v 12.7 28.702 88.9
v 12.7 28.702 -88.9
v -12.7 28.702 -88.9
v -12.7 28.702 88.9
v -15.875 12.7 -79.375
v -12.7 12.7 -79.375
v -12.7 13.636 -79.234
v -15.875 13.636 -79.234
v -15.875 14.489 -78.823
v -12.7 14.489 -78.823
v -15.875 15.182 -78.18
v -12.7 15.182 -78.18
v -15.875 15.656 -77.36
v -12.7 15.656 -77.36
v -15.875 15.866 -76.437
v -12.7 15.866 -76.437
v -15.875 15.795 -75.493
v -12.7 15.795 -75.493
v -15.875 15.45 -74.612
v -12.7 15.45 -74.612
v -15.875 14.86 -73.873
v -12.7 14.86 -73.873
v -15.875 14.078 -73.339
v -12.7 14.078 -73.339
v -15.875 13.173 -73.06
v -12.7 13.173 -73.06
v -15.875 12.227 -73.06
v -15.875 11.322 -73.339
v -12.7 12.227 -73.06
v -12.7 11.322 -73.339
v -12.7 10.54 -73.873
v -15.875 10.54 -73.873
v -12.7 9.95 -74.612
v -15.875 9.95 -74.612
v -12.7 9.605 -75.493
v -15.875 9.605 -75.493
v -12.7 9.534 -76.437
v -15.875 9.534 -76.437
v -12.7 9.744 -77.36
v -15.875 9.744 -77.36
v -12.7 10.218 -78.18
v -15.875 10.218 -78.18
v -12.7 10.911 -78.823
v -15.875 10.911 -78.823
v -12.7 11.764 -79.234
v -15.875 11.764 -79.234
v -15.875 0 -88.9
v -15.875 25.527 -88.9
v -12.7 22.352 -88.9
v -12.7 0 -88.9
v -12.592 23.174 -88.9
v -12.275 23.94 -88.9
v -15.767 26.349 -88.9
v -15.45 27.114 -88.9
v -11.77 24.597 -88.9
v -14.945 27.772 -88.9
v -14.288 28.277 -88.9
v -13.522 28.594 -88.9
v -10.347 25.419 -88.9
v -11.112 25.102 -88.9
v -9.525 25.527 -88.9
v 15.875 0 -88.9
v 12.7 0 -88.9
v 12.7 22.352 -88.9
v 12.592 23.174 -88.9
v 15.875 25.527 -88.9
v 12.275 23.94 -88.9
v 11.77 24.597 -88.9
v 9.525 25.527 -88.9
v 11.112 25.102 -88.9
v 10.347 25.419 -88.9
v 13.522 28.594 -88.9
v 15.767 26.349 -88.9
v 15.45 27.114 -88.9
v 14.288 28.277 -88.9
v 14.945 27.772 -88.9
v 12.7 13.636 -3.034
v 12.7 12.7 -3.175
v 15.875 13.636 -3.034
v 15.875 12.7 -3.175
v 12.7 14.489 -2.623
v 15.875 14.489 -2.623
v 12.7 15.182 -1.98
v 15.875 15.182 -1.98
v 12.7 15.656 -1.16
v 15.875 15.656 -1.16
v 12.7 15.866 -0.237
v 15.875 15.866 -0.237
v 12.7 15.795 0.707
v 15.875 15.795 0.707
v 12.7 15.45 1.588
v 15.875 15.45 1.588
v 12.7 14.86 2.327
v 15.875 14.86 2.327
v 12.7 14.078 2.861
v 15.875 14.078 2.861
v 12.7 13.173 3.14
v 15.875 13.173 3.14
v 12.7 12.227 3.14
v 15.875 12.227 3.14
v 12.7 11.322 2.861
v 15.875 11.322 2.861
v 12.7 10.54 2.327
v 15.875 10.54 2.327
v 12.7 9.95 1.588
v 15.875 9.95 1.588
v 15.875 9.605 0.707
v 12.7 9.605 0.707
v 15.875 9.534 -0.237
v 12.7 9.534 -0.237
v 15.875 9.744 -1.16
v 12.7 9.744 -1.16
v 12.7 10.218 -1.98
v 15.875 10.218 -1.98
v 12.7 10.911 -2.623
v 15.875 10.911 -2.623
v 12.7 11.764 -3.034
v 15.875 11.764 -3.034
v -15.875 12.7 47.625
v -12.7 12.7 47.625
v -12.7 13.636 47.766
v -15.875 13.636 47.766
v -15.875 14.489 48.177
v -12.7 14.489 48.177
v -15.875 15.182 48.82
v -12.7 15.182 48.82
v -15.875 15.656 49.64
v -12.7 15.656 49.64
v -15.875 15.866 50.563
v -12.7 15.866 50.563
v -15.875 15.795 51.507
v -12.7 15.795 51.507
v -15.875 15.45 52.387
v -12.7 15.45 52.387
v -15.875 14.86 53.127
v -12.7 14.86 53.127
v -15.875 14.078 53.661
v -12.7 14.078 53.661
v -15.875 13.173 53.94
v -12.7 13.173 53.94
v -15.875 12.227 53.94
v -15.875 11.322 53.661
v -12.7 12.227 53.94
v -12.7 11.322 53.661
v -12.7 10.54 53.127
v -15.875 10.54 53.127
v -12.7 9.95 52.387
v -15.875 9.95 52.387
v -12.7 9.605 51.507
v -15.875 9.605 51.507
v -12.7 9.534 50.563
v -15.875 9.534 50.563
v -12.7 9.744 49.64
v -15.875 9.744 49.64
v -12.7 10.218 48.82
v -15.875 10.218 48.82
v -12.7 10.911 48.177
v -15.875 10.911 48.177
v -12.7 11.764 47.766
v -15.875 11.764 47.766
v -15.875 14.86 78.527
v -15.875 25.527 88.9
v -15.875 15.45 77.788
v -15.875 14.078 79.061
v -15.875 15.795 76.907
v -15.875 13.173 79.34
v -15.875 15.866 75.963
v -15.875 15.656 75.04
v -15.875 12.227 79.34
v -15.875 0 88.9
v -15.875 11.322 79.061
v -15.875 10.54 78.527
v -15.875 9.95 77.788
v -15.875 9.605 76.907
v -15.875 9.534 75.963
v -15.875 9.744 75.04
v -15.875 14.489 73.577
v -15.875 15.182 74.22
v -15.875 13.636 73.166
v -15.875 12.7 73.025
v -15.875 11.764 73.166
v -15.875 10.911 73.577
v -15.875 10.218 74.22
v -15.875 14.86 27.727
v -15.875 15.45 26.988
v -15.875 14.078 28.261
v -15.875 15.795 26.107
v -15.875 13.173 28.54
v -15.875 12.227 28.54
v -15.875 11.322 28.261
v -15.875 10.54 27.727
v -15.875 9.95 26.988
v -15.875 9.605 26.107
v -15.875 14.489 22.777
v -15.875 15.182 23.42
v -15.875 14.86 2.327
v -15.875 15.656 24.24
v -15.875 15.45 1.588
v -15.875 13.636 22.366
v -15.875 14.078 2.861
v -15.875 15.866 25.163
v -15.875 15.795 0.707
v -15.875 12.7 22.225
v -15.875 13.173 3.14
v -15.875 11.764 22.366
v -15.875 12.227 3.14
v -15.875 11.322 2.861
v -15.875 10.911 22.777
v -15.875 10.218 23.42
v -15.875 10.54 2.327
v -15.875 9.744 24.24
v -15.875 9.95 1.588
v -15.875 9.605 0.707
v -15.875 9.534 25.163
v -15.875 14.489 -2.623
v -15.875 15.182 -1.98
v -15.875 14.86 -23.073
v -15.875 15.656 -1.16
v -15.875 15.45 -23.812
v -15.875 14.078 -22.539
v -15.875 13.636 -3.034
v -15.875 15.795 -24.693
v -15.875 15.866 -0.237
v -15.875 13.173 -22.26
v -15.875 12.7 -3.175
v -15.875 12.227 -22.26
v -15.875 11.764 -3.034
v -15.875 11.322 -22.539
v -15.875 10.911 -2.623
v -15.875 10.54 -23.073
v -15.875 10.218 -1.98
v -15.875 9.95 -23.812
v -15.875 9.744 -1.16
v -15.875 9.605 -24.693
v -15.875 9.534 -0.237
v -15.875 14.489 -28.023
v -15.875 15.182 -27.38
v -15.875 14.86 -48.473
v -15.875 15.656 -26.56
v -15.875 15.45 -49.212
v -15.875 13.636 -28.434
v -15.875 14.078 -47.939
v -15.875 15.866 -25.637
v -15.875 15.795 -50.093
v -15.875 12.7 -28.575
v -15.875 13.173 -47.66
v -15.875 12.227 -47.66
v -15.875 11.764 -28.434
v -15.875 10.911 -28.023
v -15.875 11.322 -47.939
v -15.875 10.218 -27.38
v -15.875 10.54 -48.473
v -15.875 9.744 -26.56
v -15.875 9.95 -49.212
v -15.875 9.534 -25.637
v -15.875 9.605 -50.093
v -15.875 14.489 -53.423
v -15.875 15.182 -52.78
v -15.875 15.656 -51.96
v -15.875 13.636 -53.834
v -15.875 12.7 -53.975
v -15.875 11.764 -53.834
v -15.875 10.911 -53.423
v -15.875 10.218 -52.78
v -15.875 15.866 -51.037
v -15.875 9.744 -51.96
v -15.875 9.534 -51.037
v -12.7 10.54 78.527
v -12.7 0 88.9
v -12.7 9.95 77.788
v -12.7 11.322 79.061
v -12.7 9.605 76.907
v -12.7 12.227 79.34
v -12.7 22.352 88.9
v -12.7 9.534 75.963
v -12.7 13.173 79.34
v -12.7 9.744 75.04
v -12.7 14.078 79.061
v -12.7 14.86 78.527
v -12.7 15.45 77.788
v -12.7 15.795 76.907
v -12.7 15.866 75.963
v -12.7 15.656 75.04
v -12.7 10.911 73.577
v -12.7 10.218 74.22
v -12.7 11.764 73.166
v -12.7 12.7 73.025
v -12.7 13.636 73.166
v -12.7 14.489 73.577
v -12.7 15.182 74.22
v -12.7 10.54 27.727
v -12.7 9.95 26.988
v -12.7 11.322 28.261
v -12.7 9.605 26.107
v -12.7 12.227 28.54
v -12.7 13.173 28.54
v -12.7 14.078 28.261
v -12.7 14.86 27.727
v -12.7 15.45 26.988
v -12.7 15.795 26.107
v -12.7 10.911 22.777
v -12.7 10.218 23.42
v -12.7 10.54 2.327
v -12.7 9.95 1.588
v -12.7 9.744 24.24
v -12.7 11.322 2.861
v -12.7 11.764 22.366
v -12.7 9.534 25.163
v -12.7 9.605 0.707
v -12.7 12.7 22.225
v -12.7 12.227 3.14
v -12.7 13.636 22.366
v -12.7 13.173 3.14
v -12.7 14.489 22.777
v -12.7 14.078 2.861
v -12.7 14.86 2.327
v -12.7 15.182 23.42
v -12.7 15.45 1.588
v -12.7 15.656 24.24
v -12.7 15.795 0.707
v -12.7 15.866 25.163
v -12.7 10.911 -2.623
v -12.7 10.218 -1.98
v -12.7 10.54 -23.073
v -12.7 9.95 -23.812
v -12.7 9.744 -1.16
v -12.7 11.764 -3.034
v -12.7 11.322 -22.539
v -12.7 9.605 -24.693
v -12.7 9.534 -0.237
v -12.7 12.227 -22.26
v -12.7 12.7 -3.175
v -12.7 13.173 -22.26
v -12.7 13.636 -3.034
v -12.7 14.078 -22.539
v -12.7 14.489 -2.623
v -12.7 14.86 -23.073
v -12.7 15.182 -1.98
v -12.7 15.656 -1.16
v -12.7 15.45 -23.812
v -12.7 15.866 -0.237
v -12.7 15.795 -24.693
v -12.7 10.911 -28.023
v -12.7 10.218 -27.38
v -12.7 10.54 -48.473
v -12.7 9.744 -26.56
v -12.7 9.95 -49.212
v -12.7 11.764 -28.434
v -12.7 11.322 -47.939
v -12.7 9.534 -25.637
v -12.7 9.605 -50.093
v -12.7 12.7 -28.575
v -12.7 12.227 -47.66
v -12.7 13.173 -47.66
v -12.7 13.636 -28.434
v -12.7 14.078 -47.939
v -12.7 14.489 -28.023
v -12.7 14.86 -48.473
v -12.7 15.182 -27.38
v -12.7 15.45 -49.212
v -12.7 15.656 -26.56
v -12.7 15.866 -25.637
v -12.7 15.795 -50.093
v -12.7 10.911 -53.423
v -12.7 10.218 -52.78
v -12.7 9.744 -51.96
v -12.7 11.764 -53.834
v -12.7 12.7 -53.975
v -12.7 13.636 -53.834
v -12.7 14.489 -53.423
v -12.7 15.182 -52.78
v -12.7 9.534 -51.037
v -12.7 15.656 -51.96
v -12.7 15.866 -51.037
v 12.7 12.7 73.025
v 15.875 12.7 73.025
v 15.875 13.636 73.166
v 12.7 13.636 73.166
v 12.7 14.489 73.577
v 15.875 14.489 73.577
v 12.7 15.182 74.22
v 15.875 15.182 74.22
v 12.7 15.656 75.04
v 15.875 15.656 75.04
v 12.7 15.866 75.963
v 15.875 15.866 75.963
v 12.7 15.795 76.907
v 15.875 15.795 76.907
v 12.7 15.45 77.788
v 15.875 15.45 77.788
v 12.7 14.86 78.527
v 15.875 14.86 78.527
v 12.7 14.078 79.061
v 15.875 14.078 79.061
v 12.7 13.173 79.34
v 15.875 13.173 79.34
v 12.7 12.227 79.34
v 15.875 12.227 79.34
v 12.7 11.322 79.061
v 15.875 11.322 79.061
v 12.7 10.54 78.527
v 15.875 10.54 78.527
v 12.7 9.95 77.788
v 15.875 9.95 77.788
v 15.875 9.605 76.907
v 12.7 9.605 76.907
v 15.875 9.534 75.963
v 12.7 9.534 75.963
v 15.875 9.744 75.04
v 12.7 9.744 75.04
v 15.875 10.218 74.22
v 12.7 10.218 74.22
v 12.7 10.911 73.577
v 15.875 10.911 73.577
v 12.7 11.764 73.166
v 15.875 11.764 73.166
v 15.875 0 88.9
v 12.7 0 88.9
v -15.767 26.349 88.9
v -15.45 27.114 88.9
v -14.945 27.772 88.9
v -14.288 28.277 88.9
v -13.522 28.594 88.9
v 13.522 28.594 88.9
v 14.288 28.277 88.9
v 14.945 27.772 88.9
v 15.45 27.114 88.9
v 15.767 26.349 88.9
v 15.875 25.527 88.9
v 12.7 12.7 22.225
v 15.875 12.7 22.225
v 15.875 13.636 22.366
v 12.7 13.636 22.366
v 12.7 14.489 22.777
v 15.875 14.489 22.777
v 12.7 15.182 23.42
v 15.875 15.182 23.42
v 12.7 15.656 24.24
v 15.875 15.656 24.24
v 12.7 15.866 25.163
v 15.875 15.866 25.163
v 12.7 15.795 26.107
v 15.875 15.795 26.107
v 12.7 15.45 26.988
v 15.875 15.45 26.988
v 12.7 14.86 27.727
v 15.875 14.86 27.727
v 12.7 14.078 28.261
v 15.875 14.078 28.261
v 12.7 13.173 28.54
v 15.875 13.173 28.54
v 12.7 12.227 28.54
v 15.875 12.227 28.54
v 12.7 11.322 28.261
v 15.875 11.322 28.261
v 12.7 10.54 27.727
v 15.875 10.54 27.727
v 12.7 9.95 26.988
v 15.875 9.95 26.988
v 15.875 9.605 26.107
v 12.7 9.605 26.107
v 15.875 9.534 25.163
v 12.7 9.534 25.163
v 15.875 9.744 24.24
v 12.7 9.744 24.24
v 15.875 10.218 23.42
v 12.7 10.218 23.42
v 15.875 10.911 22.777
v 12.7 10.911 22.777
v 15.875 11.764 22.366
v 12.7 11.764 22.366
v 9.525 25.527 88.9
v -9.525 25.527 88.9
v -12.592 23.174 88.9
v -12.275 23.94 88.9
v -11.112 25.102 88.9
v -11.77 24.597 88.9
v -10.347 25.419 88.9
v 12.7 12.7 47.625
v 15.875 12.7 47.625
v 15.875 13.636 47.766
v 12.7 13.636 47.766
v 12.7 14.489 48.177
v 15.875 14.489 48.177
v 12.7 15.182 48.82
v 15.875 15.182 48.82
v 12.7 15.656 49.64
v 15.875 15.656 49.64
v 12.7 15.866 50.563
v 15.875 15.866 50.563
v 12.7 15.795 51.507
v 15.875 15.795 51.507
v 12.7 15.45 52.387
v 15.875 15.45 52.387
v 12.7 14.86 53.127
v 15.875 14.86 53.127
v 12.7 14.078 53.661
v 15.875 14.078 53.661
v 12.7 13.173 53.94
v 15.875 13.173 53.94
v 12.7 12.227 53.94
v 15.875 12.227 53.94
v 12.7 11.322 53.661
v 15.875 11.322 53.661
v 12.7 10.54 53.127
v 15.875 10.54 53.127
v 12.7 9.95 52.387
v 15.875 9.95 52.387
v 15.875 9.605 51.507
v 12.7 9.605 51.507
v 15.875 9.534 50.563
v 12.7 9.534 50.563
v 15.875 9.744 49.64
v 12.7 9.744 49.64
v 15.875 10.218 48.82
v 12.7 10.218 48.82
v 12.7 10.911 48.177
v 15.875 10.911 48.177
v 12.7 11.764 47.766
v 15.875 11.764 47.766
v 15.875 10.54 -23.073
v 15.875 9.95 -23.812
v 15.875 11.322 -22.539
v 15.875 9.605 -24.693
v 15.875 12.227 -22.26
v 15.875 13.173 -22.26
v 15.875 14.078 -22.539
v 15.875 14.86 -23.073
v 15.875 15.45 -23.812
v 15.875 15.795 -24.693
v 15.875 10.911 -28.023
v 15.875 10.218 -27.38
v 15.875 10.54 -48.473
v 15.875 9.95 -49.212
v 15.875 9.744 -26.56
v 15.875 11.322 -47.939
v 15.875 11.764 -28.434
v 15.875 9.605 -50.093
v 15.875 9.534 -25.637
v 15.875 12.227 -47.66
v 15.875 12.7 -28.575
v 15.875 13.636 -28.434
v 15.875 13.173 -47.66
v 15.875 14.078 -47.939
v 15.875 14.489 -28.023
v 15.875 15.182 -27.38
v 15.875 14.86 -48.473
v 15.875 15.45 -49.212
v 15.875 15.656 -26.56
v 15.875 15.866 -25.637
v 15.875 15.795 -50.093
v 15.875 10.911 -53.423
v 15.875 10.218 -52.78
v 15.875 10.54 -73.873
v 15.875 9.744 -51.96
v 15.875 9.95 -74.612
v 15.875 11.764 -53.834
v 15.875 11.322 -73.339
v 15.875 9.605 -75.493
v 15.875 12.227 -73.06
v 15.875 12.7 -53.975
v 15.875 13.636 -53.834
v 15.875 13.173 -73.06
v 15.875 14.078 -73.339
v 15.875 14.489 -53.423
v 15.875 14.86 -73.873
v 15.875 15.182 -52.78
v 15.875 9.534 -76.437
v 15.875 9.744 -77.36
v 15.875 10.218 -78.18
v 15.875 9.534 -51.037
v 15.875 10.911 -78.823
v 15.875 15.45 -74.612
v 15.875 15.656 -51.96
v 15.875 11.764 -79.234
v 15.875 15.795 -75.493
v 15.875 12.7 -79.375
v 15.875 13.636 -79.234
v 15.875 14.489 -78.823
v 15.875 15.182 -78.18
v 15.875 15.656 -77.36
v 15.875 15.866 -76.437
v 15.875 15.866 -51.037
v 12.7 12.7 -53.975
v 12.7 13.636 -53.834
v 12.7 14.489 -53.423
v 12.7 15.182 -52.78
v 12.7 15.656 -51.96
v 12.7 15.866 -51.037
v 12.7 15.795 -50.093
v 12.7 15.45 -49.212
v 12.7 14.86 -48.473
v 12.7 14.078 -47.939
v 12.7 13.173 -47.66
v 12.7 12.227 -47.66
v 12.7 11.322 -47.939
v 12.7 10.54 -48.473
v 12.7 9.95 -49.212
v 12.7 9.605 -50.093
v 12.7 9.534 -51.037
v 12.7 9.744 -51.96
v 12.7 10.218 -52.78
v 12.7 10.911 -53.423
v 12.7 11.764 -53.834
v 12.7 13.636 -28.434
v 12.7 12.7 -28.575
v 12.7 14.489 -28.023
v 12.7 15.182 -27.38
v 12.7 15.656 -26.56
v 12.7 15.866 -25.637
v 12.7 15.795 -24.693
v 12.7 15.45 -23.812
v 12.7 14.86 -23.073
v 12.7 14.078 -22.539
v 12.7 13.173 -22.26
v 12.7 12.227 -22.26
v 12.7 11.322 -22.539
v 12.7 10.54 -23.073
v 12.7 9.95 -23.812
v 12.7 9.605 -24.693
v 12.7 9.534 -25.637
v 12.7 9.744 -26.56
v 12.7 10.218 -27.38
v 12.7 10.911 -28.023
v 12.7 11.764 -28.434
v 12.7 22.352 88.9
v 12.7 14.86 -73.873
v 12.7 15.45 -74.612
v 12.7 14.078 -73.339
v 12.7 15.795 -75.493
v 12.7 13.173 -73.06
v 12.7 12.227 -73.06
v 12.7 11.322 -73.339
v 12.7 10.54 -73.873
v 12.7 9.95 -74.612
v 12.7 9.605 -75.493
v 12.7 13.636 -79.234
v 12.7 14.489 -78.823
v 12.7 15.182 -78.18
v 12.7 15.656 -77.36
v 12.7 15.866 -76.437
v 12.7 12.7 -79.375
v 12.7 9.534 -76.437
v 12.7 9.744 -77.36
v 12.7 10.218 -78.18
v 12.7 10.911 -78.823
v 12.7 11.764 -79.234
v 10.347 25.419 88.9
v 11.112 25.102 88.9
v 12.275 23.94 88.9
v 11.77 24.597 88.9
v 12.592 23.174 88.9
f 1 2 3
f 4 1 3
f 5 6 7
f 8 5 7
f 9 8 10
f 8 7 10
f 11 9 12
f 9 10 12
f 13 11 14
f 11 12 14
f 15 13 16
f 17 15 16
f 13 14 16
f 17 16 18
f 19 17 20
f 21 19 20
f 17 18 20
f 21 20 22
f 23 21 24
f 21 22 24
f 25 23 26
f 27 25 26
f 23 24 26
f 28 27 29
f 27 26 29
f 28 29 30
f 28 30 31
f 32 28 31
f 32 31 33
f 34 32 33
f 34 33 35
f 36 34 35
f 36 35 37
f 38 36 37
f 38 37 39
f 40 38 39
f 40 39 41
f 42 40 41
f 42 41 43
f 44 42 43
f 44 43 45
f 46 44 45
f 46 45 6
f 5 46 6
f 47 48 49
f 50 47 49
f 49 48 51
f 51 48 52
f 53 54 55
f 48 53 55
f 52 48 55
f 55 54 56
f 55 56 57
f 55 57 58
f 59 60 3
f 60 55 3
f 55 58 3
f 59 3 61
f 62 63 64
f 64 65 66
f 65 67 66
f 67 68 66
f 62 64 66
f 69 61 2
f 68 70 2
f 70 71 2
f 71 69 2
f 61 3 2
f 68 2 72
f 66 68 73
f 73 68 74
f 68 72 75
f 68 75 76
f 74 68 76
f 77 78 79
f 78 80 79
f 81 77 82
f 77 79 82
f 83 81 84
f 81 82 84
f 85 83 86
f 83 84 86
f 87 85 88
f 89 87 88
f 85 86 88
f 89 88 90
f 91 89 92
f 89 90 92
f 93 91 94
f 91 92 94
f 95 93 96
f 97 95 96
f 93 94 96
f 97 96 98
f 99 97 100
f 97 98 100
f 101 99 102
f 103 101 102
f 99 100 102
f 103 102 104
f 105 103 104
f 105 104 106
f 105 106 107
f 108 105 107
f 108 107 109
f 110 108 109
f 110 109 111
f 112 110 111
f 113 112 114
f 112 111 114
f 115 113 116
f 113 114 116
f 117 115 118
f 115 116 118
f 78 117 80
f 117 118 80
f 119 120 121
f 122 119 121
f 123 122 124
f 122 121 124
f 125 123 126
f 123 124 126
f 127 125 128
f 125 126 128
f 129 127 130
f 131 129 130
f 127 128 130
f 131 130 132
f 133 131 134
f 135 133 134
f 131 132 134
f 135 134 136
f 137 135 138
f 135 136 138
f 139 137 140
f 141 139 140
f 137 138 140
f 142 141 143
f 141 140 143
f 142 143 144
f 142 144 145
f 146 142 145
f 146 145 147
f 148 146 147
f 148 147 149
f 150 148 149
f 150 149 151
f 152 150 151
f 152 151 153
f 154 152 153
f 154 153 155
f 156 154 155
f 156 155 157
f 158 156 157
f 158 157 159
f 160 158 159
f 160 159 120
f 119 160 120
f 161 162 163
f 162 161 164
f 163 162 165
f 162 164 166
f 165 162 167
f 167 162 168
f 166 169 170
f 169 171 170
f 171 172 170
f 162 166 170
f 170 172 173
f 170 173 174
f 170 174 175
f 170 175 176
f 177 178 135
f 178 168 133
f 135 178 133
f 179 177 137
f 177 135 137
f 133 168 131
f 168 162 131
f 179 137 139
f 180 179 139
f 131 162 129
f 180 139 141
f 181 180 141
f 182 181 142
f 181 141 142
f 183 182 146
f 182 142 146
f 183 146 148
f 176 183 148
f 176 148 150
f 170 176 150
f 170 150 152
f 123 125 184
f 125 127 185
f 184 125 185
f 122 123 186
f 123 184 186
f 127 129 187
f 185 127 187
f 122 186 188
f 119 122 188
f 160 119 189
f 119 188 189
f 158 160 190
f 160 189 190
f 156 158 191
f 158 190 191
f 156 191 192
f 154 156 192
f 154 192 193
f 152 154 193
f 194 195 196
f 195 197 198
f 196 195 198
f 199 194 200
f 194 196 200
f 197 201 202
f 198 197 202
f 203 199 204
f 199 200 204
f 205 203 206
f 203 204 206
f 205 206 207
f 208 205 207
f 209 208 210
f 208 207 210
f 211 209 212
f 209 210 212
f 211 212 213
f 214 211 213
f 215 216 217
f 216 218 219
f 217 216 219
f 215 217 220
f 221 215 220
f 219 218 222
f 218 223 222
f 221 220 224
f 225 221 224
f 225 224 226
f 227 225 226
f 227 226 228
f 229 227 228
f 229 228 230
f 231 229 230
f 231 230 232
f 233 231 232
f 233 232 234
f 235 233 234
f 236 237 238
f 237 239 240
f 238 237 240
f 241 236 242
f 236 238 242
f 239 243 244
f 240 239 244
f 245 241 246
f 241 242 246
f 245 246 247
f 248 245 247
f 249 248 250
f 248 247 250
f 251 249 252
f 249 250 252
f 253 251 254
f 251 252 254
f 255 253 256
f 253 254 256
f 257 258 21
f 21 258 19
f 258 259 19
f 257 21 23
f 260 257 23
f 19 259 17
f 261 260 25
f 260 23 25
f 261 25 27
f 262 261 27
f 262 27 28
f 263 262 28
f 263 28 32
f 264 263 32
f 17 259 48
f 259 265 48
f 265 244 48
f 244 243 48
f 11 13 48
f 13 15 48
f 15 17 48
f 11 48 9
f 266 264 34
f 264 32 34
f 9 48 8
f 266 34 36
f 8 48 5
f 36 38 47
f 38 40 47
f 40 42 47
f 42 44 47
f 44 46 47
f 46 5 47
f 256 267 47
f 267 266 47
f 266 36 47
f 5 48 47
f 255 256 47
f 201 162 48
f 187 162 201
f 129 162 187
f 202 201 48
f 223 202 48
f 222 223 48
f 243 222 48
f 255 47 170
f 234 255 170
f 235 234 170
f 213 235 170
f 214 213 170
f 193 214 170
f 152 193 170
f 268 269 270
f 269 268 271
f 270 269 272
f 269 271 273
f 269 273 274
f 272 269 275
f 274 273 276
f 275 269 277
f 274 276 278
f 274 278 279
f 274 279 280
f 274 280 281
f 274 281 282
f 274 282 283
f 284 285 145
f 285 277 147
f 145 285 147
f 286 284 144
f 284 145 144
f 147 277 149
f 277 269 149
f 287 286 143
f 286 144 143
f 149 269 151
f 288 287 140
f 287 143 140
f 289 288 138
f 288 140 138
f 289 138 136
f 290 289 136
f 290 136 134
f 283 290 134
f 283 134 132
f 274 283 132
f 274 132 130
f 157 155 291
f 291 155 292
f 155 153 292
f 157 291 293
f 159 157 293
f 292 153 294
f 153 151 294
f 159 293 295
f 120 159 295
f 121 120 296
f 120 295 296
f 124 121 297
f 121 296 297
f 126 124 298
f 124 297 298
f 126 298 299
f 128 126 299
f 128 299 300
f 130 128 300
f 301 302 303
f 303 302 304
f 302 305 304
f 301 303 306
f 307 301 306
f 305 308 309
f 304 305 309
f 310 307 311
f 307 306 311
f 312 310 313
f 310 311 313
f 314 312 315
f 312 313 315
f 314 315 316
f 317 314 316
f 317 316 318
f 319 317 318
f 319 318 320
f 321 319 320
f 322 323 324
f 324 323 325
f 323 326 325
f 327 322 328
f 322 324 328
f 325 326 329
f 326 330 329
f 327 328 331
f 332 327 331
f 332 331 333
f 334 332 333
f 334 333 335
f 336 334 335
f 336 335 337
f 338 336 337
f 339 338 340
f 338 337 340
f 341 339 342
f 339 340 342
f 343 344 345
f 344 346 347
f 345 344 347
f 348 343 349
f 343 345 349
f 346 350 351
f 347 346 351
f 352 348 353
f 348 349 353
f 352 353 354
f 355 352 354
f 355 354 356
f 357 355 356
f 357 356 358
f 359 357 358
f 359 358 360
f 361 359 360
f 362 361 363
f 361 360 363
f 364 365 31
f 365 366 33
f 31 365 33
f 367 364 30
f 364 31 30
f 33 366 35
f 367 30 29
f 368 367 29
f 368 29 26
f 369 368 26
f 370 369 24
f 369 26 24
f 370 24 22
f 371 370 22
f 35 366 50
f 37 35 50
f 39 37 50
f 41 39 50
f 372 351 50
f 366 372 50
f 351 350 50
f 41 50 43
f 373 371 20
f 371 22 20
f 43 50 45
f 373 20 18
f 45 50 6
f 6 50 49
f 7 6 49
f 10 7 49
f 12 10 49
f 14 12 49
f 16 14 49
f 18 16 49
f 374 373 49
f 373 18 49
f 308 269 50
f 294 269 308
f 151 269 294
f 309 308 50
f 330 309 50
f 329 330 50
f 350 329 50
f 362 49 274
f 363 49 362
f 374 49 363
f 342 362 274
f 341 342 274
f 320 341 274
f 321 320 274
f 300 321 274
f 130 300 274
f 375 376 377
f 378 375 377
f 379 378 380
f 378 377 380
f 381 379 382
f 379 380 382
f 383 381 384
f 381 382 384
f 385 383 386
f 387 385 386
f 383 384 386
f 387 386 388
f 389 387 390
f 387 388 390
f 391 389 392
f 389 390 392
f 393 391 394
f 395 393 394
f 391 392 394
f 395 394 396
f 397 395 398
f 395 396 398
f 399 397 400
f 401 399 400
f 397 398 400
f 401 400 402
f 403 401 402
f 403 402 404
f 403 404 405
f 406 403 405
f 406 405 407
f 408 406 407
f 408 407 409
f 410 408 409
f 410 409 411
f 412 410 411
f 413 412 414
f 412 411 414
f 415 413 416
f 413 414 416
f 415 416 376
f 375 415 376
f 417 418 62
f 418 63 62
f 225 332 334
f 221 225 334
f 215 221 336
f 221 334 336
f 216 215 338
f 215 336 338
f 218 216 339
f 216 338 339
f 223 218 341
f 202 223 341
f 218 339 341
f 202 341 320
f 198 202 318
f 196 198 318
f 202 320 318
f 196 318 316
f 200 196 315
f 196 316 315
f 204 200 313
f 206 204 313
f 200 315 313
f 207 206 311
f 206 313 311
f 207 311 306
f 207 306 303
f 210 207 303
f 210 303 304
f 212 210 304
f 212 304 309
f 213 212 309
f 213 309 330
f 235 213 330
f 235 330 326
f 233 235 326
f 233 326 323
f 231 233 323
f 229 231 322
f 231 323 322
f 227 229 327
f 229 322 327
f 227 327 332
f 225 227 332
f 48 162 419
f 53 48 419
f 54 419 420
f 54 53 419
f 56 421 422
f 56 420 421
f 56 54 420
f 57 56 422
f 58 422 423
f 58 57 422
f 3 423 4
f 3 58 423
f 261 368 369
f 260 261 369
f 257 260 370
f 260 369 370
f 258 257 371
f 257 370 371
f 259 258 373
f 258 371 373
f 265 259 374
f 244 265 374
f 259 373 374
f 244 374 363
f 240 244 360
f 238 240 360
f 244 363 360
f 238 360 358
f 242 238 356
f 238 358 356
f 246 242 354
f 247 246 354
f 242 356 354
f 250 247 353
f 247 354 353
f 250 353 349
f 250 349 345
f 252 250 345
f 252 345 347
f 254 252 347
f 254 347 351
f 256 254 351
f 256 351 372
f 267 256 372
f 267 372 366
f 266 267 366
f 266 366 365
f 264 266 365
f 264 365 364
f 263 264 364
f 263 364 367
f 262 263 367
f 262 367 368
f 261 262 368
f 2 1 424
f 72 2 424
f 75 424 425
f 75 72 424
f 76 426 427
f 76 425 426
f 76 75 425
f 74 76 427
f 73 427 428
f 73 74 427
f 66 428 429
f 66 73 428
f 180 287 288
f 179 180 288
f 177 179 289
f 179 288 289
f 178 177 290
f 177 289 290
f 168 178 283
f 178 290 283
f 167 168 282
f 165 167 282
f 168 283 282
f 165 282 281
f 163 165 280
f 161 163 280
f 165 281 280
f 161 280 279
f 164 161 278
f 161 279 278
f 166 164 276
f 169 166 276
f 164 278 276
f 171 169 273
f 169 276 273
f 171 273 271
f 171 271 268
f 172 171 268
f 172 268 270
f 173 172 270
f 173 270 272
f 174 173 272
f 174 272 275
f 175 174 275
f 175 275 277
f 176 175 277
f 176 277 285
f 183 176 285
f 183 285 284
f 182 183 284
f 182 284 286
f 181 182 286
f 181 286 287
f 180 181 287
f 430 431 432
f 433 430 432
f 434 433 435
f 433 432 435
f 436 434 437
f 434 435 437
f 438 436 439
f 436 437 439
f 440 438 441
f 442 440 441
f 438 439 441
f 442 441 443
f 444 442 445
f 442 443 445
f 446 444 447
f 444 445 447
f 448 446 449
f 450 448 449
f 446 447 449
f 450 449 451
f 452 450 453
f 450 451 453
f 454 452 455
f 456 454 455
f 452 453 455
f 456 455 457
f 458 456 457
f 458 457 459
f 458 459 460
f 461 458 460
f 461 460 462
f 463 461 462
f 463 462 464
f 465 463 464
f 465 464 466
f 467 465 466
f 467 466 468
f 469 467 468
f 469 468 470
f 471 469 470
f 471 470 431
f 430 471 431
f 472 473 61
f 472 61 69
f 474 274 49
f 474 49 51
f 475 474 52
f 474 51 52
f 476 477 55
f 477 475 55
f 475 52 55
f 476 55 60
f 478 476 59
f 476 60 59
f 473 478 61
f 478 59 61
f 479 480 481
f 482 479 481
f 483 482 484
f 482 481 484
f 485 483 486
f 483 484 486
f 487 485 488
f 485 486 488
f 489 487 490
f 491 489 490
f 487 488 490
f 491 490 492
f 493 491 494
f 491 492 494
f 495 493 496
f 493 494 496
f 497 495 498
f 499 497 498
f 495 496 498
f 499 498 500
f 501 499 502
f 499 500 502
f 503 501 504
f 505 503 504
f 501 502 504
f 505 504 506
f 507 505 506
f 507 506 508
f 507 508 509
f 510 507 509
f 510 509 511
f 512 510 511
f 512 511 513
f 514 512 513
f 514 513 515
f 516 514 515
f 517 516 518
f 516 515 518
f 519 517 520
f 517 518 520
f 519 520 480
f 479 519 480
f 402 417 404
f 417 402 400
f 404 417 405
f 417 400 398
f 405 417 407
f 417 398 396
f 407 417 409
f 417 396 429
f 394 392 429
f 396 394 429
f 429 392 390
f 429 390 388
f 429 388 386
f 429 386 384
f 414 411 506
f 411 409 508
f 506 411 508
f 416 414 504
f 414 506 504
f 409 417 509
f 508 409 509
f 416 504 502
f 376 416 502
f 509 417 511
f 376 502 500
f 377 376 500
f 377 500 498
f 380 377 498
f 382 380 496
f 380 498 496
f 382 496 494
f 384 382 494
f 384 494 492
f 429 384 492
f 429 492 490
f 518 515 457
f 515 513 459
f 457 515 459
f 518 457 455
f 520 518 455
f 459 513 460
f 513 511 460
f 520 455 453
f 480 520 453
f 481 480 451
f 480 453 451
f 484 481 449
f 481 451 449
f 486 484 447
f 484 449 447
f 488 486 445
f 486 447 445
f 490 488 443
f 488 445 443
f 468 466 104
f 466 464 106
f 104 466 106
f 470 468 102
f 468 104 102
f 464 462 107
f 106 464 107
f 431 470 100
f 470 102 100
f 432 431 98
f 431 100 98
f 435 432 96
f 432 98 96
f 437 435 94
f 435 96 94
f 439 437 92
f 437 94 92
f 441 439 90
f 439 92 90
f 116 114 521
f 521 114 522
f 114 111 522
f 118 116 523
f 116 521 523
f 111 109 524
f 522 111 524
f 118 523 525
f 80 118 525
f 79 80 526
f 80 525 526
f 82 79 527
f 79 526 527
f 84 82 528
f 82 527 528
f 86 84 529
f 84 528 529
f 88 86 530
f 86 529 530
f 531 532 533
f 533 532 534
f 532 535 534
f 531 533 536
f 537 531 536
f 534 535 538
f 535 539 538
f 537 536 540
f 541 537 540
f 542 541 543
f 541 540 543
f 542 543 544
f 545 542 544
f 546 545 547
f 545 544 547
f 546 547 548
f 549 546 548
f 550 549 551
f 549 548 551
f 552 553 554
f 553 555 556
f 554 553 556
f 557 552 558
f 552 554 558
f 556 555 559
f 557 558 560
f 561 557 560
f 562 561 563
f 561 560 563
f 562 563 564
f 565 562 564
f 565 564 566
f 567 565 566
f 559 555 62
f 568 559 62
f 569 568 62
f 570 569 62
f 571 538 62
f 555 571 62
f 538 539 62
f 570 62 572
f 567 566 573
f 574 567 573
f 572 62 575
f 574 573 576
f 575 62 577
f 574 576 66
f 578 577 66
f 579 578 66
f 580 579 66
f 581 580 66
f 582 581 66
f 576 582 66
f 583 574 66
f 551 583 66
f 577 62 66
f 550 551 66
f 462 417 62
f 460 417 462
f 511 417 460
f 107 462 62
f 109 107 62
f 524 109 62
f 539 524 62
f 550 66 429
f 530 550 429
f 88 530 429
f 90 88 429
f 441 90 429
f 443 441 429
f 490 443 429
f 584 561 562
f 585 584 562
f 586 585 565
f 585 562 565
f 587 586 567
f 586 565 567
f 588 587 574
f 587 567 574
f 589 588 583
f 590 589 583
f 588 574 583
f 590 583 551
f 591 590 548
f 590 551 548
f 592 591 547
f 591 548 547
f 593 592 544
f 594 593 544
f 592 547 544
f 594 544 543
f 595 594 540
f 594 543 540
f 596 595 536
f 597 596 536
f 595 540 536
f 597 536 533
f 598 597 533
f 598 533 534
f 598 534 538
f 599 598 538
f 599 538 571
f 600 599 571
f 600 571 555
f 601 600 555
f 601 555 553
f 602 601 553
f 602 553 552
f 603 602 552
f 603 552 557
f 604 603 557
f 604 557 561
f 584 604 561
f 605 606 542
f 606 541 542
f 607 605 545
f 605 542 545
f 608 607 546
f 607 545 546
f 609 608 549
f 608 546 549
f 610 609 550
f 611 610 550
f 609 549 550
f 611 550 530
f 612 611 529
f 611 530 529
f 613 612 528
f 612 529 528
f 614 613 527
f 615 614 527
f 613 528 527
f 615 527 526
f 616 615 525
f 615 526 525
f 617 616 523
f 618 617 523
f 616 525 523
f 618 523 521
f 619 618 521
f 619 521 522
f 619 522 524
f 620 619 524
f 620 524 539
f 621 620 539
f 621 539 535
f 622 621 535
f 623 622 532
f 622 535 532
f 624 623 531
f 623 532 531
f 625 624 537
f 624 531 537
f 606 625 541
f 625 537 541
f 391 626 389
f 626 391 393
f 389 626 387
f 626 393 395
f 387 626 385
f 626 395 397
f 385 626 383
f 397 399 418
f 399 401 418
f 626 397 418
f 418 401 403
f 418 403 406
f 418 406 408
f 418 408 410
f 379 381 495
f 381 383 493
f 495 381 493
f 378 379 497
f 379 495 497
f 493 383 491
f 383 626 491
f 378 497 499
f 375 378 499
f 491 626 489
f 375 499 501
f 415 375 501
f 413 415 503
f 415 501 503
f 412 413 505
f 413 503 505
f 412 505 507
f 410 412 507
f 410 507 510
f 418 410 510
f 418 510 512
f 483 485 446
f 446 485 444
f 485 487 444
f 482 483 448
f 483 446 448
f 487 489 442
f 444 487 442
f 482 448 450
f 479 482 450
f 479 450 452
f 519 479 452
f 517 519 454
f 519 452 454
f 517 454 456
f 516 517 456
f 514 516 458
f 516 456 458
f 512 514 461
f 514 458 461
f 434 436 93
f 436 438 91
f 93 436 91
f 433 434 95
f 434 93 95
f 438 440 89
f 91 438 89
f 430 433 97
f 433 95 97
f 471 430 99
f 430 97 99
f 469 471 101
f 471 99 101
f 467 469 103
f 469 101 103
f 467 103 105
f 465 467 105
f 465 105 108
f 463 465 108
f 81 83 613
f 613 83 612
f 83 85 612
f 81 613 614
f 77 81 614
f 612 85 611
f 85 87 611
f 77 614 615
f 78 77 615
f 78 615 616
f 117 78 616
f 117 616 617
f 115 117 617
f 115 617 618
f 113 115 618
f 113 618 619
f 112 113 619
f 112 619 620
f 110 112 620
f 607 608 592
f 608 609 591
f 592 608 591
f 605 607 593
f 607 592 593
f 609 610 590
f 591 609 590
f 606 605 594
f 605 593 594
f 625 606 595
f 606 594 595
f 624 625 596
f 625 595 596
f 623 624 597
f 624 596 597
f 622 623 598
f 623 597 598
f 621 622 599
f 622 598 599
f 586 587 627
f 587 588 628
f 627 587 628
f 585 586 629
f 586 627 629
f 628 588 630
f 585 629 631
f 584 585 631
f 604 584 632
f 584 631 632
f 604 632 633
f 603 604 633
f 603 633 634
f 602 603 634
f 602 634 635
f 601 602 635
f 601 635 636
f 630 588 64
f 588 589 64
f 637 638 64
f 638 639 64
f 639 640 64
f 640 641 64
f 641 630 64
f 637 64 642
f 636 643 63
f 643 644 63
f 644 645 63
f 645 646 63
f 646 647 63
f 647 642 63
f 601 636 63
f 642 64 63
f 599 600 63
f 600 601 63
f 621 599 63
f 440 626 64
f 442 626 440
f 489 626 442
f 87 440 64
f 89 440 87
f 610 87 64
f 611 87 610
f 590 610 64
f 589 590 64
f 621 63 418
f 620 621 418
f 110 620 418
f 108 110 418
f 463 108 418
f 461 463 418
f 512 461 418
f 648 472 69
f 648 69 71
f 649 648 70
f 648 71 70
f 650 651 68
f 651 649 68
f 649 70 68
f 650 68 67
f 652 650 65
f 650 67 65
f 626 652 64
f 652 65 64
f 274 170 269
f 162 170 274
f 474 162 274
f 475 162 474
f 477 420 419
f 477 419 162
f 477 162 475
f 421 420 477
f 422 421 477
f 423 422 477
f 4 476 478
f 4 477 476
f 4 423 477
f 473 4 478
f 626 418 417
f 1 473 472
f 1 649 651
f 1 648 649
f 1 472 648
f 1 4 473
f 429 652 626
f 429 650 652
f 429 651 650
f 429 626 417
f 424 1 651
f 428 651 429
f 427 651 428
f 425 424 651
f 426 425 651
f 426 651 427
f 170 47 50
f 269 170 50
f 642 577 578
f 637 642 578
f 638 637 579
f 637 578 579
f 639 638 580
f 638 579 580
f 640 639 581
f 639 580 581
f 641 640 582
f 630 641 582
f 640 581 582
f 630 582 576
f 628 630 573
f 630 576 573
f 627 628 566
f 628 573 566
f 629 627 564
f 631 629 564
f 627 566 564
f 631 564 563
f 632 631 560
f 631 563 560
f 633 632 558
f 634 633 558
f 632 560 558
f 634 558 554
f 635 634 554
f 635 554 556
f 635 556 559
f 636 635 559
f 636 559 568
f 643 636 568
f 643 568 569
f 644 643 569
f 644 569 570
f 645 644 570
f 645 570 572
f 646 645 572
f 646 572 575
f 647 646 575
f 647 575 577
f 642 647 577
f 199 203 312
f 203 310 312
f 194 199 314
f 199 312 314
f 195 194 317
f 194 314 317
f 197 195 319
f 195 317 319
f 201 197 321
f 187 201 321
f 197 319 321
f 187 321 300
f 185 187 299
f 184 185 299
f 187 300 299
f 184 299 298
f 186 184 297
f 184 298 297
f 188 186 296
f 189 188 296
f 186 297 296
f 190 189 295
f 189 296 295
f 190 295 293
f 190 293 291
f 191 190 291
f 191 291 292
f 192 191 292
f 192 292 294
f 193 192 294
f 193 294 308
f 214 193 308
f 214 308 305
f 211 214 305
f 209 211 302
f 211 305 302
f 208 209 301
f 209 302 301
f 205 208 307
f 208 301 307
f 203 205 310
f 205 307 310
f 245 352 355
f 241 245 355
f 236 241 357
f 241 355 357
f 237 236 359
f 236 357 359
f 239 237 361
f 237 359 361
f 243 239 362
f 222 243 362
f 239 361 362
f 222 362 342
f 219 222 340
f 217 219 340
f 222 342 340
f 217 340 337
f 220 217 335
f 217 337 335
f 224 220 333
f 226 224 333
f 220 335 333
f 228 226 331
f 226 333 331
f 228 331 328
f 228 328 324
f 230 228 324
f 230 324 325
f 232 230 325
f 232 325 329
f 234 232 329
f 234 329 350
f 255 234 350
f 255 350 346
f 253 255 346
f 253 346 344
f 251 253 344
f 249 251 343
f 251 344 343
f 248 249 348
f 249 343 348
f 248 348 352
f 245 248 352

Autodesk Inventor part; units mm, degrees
ref_plane "YZ Plane" through (0, 0, 0) normal (1, 0, 0) x (0, 1, 0)
ref_plane "XZ Plane" through (0, 0, 0) normal (0, 1, 0) x (-1, 0, 0)
ref_plane "XY Plane" through (0, 0, 0) normal (0, 0, 1) x (1, 0, 0)
sketch "Sketch1" plane through (0, 0, 0) normal (0, 0, 1) x (1, 0, 0)
  line L0 (-15.875, 0) -> (-12.7, 0)
  line L1 (-12.7, 0) -> (-12.7, 22.352)
  line L2 (-9.525, 25.527) -> (9.525, 25.527)
  line L3 (12.7, 22.352) -> (12.7, 0)
  line L4 (12.7, 0) -> (15.875, 0)
  line L5 (15.875, 0) -> (15.875, 25.527)
  line L6 (12.7, 28.702) -> (-12.7, 28.702)
  line L7 (-15.875, 25.527) -> (-15.875, 0)
  arc A0 (-9.525, 25.527) -> (-12.7, 22.352) centre (-9.525, 22.352) ccw
  arc A1 (12.7, 22.352) -> (9.525, 25.527) centre (9.525, 22.352) ccw
  arc A2 (-12.7, 28.702) -> (-15.875, 25.527) centre (-12.7, 25.527) ccw
  arc A3 (15.875, 25.527) -> (12.7, 28.702) centre (12.7, 25.527) ccw
  line L8 (0, 35.2315) -> (0, -5.8719) projected
  point P0 (0, 0)
  dimension "d0" = 28.702
  dimension "d1" = 31.75
  dimension "d2" = 3.175
  dimension "d3" = 3.175
  dimension "d4" = 3.175
extrude "Extrusion1" add sketch "Sketch1" along normal mid plane 177.8
sketch "Sketch4" plane through (15.875, 0, 88.9) normal (1, 0, 0) x (0, 0, -1)
  line L0 (88.9, -5.7404) -> (88.9, 34.4424) construction
  line L1 (-35.56, 0) -> (213.36, 0) construction
  circle A0 centre (88.9, 12.7) radius 3.175
  point P0 (88.9, 0)
  dimension "d34" = 12.7
  dimension "d35" = 0
  dimension "d36" = 6.35
extrude "Extrusion4" cut sketch "Sketch4" against normal up to surface (31.75 mm away)
pattern_linear "Rectangular Pattern3" count 30 spacing 25.4 along (0, 0, 1) count 30 spacing 25.4 along (0, 0, -1) of "Extrusion4"
equation "\"d5\" = ExtensionLen"
equation "\"ExtensionLen\" = 177.8"
properties part number "NTowerChannelBracket" material "Aluminum 6061"
